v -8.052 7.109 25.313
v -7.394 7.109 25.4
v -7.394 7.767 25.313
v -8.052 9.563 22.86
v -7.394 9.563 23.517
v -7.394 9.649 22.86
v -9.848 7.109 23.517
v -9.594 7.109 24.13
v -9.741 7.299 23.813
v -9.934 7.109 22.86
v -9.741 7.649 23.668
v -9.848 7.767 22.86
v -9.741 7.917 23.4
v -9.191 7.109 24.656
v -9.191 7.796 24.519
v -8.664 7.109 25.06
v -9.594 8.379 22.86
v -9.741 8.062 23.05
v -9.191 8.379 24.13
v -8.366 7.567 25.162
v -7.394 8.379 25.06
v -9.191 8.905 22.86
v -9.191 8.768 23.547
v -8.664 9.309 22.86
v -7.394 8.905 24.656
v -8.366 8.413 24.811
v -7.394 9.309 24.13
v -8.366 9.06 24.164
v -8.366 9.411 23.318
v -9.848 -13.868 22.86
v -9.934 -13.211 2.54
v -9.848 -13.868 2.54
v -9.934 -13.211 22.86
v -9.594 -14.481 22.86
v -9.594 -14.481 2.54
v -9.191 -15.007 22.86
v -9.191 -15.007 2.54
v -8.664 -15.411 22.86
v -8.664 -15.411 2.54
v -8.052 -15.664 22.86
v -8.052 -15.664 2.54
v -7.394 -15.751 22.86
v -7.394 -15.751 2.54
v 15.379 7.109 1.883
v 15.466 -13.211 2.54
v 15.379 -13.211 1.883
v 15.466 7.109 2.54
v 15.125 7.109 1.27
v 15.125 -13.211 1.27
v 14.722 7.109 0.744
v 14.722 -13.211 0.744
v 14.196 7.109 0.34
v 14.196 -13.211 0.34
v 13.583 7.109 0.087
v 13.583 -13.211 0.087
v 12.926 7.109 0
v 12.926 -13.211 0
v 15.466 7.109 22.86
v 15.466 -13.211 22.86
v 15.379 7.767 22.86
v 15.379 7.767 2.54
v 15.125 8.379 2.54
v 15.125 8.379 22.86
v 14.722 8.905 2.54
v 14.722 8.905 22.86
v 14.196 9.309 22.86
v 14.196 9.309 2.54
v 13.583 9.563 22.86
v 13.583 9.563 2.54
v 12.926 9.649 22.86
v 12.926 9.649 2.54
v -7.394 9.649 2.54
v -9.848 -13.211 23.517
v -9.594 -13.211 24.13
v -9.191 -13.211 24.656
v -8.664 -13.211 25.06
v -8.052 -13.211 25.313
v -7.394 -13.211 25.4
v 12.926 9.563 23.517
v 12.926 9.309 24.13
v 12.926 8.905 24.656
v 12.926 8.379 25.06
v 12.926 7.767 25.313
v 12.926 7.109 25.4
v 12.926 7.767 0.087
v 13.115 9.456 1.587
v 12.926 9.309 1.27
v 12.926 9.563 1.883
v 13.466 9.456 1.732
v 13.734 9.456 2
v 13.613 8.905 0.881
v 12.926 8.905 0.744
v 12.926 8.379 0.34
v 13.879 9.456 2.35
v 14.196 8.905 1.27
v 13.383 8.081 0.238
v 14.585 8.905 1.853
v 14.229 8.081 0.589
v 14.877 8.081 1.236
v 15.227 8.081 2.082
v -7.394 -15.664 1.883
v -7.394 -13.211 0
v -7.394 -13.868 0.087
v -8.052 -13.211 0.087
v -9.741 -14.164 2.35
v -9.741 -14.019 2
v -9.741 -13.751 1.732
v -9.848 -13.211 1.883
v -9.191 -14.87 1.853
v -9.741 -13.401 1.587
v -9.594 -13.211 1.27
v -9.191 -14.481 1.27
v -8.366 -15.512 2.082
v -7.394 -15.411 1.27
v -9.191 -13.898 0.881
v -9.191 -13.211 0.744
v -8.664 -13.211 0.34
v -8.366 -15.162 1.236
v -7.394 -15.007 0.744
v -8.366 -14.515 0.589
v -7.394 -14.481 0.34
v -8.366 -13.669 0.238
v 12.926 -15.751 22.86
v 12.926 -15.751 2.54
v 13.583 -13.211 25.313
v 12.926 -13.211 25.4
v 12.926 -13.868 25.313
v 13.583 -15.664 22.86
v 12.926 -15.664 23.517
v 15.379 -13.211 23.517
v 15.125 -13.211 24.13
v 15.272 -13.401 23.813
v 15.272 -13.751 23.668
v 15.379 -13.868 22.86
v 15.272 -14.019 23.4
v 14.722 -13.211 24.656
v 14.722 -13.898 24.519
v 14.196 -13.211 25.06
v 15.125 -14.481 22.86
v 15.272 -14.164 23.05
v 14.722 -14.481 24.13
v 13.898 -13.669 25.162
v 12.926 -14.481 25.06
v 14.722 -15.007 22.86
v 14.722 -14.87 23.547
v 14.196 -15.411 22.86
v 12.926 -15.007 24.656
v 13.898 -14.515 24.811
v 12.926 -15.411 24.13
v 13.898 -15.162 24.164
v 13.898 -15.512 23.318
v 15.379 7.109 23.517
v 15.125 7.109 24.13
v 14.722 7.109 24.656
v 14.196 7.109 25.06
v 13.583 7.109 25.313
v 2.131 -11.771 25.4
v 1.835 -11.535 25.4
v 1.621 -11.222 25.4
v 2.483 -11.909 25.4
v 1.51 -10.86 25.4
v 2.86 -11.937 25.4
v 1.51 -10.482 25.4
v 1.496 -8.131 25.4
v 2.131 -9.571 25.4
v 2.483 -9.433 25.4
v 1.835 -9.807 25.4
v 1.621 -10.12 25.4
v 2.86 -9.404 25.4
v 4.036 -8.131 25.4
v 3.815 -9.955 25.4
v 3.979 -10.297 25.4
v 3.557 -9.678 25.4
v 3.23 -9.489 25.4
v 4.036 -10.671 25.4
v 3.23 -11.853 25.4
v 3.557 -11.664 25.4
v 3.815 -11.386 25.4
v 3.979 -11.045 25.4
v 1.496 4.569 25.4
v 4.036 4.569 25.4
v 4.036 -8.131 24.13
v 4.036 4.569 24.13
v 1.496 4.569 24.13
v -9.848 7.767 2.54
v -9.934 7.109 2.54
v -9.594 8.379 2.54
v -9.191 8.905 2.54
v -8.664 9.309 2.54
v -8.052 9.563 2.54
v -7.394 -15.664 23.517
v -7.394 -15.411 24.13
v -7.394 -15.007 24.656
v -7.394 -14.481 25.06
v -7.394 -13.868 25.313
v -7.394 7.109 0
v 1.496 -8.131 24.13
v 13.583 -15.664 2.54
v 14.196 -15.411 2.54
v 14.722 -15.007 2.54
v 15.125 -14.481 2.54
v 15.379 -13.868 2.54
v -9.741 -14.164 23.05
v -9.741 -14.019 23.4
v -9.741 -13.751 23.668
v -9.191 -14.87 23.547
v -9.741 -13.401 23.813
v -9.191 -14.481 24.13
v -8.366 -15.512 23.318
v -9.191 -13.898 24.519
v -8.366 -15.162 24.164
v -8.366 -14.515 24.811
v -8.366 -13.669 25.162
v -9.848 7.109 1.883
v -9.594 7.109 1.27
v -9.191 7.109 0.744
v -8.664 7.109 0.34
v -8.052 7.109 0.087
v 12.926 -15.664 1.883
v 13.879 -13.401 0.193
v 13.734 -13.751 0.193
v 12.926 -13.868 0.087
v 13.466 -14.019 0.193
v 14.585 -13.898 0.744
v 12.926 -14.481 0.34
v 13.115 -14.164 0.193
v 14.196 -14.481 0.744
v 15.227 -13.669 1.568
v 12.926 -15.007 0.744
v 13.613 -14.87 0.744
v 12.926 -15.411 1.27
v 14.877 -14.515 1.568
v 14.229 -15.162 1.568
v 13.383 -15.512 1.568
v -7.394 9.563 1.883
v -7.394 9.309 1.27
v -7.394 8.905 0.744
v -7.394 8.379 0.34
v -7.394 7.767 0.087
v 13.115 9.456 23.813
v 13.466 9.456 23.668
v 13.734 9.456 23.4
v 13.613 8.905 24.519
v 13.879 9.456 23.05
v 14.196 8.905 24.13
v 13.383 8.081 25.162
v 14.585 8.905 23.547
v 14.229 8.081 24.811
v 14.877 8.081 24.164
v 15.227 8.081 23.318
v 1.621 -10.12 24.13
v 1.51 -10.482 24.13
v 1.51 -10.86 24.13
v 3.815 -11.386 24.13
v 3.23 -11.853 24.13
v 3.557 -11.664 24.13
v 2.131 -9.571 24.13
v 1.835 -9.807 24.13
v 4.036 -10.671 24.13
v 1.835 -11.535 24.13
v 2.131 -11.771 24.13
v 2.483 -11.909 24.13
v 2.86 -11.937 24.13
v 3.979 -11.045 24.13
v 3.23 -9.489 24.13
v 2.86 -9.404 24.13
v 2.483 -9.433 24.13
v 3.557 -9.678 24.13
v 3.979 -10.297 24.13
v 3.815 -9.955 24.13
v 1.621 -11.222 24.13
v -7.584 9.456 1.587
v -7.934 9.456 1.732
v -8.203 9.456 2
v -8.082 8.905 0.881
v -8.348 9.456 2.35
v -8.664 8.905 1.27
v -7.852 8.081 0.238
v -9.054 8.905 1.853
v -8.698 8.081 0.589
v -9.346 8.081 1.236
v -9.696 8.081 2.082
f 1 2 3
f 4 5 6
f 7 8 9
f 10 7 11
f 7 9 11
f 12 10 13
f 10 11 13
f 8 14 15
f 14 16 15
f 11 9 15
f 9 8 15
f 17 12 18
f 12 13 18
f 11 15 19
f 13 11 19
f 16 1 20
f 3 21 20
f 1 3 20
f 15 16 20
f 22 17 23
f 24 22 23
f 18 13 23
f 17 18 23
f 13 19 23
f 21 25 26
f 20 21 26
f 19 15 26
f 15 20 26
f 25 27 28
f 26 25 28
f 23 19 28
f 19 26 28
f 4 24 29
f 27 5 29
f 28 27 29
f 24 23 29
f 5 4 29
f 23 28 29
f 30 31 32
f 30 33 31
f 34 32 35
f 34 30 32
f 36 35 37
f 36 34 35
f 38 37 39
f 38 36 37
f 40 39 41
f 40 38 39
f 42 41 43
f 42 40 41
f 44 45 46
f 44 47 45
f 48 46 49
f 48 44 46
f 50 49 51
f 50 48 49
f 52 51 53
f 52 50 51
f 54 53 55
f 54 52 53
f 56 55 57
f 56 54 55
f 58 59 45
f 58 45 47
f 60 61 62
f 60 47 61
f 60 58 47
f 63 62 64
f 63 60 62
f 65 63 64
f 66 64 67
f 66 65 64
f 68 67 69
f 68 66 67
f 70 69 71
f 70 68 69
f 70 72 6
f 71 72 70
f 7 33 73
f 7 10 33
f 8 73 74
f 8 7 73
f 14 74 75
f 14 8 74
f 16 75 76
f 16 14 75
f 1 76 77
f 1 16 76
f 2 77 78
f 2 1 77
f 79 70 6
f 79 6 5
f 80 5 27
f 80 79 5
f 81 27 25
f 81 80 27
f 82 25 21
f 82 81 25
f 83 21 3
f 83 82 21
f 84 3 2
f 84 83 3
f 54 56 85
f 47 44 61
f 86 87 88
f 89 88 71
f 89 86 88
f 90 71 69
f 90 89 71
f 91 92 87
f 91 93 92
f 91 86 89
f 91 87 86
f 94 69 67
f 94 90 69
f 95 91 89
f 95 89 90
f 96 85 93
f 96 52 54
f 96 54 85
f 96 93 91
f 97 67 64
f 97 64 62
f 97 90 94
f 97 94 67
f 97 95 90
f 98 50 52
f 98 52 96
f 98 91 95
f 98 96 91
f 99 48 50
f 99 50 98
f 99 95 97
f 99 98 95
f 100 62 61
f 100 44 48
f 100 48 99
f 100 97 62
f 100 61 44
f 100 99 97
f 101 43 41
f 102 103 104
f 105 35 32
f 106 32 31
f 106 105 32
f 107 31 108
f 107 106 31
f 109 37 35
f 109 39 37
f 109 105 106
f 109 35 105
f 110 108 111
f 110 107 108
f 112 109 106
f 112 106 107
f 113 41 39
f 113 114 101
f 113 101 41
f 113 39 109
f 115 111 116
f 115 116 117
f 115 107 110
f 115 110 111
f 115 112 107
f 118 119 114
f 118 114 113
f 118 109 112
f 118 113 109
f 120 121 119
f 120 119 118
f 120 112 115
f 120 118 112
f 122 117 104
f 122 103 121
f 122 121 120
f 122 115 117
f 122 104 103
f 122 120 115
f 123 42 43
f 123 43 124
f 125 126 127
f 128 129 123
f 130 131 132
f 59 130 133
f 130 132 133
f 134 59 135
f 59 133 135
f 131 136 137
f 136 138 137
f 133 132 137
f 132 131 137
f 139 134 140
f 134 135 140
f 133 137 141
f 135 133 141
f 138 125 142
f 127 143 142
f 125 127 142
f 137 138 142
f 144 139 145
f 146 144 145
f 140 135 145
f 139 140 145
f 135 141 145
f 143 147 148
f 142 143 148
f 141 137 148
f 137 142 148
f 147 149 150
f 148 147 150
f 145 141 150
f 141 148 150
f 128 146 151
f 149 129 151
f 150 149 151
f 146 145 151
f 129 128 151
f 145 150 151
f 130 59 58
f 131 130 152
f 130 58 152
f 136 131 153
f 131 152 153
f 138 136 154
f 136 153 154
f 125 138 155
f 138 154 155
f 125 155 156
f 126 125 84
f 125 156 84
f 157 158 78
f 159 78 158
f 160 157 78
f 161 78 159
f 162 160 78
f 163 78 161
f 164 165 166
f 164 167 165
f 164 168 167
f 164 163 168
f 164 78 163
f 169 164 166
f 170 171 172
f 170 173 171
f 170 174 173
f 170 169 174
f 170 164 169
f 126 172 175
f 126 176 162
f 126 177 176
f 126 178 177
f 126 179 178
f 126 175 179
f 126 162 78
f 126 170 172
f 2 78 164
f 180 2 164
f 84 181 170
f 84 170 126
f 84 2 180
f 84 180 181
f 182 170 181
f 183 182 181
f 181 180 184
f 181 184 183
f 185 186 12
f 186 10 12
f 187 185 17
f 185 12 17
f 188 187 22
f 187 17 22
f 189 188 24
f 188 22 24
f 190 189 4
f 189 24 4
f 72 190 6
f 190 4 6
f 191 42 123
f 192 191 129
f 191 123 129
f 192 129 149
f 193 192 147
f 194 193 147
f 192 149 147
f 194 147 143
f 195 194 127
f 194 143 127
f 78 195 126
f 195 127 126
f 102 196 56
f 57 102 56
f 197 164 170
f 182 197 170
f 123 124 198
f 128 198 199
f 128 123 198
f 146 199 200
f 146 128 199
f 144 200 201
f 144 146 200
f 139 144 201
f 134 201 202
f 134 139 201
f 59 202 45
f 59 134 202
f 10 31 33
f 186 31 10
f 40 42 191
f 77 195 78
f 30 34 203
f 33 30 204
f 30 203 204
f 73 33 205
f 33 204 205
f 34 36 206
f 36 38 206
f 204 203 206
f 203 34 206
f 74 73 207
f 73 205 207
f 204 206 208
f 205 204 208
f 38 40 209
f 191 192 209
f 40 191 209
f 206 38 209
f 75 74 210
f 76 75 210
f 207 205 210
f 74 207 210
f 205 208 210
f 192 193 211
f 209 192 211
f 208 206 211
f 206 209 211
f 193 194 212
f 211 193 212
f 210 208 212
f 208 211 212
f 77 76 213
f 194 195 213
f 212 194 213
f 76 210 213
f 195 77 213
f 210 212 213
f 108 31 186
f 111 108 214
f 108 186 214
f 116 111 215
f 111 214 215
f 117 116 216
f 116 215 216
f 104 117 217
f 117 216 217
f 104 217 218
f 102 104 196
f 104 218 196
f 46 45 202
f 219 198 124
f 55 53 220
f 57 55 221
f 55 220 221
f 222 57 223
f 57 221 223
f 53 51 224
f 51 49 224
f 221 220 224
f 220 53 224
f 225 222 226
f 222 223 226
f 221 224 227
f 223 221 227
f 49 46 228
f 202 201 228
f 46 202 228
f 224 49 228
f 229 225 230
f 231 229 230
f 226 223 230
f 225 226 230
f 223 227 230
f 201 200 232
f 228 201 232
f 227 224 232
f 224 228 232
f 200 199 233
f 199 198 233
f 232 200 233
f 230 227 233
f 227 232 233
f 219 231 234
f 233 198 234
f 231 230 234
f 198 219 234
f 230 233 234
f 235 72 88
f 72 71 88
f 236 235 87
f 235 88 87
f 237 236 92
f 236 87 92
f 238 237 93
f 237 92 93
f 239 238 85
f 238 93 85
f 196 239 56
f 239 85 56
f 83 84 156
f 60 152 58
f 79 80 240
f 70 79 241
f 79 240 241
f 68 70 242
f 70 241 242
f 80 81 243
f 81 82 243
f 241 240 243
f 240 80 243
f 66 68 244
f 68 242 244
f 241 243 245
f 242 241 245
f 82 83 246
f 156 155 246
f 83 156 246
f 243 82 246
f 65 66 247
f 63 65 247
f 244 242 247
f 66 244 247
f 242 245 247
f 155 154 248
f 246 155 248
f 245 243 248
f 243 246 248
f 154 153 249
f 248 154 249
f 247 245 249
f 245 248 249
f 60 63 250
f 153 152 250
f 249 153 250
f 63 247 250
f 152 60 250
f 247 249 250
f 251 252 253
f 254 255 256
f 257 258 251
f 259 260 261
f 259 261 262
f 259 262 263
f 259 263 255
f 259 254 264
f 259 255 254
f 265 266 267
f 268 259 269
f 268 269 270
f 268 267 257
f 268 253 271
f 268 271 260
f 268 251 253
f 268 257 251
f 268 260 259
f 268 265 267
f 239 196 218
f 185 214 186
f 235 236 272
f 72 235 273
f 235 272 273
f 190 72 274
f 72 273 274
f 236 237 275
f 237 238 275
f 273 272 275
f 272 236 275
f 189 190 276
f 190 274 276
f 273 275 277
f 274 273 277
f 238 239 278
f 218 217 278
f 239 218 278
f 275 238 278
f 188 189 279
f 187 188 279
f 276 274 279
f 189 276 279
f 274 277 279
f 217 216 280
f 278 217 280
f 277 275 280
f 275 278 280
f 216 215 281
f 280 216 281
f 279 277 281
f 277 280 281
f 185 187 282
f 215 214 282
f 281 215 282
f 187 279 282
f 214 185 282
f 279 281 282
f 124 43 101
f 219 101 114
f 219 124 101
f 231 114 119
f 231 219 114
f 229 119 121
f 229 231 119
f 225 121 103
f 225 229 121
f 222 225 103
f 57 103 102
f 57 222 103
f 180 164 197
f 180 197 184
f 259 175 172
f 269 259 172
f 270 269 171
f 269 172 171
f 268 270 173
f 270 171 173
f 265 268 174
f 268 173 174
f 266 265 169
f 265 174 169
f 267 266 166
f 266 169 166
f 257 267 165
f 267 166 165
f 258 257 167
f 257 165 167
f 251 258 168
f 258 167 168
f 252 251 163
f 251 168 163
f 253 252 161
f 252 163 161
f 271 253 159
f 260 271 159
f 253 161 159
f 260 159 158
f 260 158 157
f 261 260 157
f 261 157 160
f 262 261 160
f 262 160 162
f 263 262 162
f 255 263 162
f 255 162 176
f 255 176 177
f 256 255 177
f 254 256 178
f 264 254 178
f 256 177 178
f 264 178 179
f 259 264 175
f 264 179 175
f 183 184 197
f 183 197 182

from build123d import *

# Parameters (mm, degrees)
F0_W     = 25.4
F0_H     = 25.4
F1_DEPTH = 25.4
F2_R     = 2.54
F3_W     = 2.54
F3_H     = 12.7
F3_R     = 1.27
F4_DEPTH = 1.27


with BuildPart() as f1:
    # F0 (on Top) → F1 (new body)
    with BuildSketch(Plane.XY):
        with Locations((2.765542, -3.050883)):
            Rectangle(F0_W, F0_H)
    extrude(amount=F1_DEPTH)

    # F2
    f2_edges = [f1.edges().sort_by_distance(p)[0] for p in [
        (2.765542, -15.750883, 25.4),
        (15.465542, -3.050883, 25.4),
        (15.465542, -15.750883, 12.7),
        (15.465542, -3.050883, 0),
        (2.765542, -15.750883, 0),
        (-9.934458, -15.750883, 12.7),
        (-9.934458, -3.050883, 0),
        (2.765542, 9.649117, 0),
        (2.765542, 9.649117, 25.4),
        (-9.934458, -3.050883, 25.4),
        (-9.934458, 9.649117, 12.7),
        (15.465542, 9.649117, 12.7),
    ]]
    fillet(f2_edges, radius=F2_R)

    # F3 (on face) → F4 (cut)
    with BuildSketch(Plane.XY.offset(25.4)):
        with Locations((2.765542, -1.780883)):
            Rectangle(F3_W, F3_H)
        with Locations((2.765542, -10.670883)):
            Circle(F3_R)
    extrude(amount=-F4_DEPTH, mode=Mode.SUBTRACT)


solid = f1.part
